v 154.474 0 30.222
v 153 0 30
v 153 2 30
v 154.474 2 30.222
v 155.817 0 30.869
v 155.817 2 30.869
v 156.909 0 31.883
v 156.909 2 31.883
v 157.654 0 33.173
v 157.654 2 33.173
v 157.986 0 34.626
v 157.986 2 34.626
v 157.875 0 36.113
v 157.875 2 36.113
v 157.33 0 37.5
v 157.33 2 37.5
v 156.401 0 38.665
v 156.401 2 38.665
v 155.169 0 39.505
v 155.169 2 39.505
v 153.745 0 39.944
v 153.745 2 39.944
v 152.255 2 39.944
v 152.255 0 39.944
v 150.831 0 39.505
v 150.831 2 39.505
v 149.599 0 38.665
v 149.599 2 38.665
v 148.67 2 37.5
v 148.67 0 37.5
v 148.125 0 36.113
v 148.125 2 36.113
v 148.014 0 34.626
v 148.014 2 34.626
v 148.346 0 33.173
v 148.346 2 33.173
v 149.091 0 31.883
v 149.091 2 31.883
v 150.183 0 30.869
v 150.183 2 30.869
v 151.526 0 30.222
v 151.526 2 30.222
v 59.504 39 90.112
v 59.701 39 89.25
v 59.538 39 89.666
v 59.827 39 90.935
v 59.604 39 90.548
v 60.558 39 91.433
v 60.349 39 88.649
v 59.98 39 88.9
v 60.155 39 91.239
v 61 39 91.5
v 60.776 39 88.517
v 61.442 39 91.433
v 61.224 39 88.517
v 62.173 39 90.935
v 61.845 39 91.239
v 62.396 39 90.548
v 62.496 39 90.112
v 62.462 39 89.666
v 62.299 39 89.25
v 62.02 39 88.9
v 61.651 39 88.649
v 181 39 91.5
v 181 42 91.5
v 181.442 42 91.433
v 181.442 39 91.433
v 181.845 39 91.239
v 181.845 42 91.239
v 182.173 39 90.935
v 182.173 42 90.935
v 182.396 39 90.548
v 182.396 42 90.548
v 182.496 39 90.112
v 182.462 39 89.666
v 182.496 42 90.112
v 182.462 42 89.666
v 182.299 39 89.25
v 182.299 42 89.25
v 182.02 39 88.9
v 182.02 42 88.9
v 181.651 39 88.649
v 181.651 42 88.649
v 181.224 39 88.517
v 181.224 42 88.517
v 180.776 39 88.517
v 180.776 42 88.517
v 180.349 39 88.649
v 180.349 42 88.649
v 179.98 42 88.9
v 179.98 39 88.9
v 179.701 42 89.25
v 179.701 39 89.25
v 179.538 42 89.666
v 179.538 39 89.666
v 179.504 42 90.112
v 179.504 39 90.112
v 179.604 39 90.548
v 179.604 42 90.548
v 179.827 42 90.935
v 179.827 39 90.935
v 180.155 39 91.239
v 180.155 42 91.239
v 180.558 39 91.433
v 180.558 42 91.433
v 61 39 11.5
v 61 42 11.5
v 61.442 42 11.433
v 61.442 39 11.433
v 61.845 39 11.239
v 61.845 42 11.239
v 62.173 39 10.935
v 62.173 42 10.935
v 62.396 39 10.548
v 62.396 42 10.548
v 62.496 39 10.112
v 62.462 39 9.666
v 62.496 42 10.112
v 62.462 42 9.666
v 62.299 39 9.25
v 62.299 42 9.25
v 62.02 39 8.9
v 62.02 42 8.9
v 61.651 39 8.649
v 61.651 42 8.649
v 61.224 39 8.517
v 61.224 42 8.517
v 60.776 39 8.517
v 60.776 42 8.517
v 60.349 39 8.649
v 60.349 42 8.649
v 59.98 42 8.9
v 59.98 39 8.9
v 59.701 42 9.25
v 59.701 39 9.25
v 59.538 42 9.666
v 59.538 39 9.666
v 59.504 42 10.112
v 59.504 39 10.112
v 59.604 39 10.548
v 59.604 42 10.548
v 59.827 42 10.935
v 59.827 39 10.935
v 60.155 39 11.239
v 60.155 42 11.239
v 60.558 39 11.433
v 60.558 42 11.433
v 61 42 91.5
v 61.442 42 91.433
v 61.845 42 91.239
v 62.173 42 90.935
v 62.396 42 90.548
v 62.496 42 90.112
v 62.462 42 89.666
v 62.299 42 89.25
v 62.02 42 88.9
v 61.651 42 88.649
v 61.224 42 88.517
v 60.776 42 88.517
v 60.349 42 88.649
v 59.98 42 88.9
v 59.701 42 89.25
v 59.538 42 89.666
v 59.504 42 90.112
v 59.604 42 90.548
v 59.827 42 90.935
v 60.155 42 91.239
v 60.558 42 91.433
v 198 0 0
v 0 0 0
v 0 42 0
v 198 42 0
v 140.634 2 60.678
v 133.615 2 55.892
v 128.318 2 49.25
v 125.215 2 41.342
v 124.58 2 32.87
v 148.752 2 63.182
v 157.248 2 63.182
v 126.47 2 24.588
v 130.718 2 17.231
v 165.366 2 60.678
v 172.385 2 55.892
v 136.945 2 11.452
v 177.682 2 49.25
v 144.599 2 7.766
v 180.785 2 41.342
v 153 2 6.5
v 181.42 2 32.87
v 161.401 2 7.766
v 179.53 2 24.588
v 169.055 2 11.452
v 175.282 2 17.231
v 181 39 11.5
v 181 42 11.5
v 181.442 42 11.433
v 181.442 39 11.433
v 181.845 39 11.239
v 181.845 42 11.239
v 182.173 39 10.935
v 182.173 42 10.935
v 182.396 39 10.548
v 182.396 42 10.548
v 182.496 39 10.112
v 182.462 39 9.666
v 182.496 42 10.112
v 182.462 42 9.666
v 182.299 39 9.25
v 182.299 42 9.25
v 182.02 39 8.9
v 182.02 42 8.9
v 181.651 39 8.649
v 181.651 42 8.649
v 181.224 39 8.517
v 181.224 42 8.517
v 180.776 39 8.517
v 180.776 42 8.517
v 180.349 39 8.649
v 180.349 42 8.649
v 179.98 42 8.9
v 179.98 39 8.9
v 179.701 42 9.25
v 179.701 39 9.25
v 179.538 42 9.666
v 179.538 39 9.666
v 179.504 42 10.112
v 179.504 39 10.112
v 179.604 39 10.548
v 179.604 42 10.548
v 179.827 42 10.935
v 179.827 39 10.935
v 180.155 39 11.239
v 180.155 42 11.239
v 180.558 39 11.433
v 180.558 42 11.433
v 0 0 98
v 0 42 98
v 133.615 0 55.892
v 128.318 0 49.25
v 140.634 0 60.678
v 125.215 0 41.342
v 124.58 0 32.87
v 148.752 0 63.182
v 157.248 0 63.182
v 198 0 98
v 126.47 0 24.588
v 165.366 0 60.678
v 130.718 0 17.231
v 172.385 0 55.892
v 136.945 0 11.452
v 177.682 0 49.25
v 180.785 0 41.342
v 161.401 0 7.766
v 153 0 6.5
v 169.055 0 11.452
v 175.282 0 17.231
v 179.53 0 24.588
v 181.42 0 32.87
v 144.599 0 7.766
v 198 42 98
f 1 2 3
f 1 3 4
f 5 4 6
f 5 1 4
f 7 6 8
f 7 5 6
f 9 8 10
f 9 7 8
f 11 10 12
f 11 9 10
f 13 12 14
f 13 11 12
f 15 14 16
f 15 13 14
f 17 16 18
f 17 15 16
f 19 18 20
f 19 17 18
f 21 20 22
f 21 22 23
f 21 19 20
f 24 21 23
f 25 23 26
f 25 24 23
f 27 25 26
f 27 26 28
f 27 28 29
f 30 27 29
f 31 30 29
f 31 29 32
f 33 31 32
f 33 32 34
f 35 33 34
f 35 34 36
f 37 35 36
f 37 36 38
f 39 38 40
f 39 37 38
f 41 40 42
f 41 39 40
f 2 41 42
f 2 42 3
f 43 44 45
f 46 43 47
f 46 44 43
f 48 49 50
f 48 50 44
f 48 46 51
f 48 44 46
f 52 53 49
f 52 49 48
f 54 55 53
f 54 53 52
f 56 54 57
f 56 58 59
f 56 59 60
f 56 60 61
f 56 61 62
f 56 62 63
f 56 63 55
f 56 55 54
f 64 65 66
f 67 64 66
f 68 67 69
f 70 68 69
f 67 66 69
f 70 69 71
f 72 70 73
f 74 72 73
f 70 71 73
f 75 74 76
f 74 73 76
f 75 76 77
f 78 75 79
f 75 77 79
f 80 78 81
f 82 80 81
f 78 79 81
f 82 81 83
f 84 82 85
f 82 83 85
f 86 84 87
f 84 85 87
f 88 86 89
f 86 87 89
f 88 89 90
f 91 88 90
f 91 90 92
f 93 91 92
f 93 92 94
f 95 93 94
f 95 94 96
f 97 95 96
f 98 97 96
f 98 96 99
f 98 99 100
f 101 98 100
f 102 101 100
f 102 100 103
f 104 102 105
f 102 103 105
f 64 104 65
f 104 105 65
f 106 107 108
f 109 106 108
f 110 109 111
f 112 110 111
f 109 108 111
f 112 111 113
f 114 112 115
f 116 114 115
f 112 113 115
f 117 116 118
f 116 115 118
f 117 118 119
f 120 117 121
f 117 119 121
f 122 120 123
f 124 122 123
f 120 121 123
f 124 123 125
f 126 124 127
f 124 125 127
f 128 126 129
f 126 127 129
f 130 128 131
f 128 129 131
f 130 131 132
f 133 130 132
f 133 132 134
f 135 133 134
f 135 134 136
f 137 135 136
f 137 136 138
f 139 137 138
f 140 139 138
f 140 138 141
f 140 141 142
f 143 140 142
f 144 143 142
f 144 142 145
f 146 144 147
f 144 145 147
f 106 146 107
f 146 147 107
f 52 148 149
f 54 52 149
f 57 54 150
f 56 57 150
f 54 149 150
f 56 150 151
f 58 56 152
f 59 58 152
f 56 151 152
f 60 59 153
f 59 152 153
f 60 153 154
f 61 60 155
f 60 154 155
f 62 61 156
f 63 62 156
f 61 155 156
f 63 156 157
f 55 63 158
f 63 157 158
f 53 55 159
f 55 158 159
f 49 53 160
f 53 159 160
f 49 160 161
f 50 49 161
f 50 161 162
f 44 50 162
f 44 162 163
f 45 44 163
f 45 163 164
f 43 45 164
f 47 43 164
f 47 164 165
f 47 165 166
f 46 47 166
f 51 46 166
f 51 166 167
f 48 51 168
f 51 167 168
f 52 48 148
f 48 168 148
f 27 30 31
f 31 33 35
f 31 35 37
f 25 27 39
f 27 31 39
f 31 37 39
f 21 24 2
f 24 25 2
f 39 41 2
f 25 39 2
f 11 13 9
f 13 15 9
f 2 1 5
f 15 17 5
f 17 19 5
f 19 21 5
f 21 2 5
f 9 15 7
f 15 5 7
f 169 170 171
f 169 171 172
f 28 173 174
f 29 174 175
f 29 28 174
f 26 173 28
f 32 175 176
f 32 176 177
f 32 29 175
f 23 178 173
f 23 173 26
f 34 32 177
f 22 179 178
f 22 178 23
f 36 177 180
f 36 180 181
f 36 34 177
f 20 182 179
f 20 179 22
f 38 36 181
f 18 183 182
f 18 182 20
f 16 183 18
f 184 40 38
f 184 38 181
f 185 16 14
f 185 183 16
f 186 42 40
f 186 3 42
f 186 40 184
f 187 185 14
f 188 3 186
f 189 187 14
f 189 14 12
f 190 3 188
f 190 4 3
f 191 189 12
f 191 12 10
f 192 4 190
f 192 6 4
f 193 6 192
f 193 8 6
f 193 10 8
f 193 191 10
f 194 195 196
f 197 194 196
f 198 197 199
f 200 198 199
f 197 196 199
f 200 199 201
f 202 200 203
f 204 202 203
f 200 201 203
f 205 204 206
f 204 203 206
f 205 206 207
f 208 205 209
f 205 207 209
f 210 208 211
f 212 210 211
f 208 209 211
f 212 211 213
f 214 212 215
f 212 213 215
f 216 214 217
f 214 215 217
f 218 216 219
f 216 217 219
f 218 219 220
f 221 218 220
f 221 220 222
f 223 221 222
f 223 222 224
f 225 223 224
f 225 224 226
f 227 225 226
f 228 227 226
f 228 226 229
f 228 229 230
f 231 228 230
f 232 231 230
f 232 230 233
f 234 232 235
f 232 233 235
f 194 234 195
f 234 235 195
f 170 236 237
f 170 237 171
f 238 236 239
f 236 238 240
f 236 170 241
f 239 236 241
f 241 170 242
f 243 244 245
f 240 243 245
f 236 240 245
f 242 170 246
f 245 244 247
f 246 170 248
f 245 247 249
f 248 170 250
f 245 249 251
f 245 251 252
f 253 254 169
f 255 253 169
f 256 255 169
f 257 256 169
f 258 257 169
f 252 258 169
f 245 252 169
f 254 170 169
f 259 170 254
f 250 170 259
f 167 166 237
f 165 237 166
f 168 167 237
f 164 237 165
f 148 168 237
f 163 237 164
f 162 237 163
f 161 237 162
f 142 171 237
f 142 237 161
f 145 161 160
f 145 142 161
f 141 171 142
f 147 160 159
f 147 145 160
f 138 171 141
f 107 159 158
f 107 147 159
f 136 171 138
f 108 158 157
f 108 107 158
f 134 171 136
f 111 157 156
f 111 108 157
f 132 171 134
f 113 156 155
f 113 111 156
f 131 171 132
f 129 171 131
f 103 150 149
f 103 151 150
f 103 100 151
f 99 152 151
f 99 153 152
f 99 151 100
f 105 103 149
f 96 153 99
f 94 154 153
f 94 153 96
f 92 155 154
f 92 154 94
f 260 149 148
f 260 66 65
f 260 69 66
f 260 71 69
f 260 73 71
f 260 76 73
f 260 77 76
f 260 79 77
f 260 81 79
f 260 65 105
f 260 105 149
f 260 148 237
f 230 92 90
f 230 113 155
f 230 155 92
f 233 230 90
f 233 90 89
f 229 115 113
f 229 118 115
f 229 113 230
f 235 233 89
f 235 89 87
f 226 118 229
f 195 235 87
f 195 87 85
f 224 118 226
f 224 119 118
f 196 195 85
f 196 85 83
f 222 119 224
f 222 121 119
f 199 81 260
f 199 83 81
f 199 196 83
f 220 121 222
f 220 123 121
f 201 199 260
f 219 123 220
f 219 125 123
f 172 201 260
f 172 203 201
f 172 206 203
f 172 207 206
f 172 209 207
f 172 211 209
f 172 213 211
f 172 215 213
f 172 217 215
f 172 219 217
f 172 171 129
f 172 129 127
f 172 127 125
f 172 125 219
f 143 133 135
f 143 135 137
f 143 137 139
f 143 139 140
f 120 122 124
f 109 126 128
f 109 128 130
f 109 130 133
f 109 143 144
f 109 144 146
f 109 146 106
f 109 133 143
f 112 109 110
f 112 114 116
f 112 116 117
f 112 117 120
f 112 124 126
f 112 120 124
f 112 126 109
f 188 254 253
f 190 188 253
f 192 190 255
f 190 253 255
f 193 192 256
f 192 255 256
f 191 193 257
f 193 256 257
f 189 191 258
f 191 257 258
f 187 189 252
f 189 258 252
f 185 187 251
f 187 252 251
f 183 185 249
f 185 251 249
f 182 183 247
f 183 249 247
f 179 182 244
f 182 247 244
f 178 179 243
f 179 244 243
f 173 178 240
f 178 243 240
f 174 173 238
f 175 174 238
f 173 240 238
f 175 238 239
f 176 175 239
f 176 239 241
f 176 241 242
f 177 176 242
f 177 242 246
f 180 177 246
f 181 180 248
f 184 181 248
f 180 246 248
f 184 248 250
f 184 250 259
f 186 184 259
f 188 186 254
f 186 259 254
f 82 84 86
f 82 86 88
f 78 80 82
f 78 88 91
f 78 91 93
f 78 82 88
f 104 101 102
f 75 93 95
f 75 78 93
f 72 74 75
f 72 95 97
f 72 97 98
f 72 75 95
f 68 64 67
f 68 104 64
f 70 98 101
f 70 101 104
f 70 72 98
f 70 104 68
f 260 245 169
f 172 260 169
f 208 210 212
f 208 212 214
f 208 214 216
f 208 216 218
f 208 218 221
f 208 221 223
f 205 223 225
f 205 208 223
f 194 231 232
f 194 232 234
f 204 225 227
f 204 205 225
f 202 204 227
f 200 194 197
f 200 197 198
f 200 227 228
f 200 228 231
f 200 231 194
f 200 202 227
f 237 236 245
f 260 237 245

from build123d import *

# Parameters (mm, degrees)
SKETCH_1_W          = 198
SKETCH_1_H          = 98
EXTRUDE_1_DEPTH     = 42
SKETCH_2_R          = 1.5
CUT_EXTRUDE_1_DEPTH = 3
SKETCH_3_R          = 28.5
SKETCH_3_R_2        = 5
CUT_EXTRUDE_2_DEPTH = 2


with BuildPart() as part:
    # 草图1 → 凸台-拉伸1 (new body)
    with BuildSketch(Plane(origin=(0, 0, 0), x_dir=(1, 0, 0), z_dir=(0, 1, 0))):
        with Locations((99, -49)):
            Rectangle(SKETCH_1_W, SKETCH_1_H)
    extrude(amount=EXTRUDE_1_DEPTH)

    # 草图2 → 切除-拉伸1 (cut)
    with BuildSketch(Plane(origin=(0, 42, 0), x_dir=(1, 0, 0), z_dir=(0, 1, 0))):
        with Locations(Location((61, -10, 0), (0, 0, 270))):
            Circle(SKETCH_2_R)
        with Locations(Location((181, -10, 0), (0, 0, 270))):
            Circle(SKETCH_2_R)
        with Locations(Location((181, -90, 0), (0, 0, 270))):
            Circle(SKETCH_2_R)
        with Locations(Location((61, -90, 0), (0, 0, 270))):
            Circle(SKETCH_2_R)
    extrude(amount=-CUT_EXTRUDE_1_DEPTH, mode=Mode.SUBTRACT)

    # 草图3 → 切除-拉伸2 (cut)
    with BuildSketch(Plane.XZ):
        with Locations(Location((153, 35, 0), (0, 0, 270))):
            Circle(SKETCH_3_R)
        with Locations(Location((153, 35, 0), (0, 0, 270))):
            Circle(SKETCH_3_R_2, mode=Mode.SUBTRACT)
    extrude(amount=-CUT_EXTRUDE_2_DEPTH, mode=Mode.SUBTRACT)


solid = part.part
